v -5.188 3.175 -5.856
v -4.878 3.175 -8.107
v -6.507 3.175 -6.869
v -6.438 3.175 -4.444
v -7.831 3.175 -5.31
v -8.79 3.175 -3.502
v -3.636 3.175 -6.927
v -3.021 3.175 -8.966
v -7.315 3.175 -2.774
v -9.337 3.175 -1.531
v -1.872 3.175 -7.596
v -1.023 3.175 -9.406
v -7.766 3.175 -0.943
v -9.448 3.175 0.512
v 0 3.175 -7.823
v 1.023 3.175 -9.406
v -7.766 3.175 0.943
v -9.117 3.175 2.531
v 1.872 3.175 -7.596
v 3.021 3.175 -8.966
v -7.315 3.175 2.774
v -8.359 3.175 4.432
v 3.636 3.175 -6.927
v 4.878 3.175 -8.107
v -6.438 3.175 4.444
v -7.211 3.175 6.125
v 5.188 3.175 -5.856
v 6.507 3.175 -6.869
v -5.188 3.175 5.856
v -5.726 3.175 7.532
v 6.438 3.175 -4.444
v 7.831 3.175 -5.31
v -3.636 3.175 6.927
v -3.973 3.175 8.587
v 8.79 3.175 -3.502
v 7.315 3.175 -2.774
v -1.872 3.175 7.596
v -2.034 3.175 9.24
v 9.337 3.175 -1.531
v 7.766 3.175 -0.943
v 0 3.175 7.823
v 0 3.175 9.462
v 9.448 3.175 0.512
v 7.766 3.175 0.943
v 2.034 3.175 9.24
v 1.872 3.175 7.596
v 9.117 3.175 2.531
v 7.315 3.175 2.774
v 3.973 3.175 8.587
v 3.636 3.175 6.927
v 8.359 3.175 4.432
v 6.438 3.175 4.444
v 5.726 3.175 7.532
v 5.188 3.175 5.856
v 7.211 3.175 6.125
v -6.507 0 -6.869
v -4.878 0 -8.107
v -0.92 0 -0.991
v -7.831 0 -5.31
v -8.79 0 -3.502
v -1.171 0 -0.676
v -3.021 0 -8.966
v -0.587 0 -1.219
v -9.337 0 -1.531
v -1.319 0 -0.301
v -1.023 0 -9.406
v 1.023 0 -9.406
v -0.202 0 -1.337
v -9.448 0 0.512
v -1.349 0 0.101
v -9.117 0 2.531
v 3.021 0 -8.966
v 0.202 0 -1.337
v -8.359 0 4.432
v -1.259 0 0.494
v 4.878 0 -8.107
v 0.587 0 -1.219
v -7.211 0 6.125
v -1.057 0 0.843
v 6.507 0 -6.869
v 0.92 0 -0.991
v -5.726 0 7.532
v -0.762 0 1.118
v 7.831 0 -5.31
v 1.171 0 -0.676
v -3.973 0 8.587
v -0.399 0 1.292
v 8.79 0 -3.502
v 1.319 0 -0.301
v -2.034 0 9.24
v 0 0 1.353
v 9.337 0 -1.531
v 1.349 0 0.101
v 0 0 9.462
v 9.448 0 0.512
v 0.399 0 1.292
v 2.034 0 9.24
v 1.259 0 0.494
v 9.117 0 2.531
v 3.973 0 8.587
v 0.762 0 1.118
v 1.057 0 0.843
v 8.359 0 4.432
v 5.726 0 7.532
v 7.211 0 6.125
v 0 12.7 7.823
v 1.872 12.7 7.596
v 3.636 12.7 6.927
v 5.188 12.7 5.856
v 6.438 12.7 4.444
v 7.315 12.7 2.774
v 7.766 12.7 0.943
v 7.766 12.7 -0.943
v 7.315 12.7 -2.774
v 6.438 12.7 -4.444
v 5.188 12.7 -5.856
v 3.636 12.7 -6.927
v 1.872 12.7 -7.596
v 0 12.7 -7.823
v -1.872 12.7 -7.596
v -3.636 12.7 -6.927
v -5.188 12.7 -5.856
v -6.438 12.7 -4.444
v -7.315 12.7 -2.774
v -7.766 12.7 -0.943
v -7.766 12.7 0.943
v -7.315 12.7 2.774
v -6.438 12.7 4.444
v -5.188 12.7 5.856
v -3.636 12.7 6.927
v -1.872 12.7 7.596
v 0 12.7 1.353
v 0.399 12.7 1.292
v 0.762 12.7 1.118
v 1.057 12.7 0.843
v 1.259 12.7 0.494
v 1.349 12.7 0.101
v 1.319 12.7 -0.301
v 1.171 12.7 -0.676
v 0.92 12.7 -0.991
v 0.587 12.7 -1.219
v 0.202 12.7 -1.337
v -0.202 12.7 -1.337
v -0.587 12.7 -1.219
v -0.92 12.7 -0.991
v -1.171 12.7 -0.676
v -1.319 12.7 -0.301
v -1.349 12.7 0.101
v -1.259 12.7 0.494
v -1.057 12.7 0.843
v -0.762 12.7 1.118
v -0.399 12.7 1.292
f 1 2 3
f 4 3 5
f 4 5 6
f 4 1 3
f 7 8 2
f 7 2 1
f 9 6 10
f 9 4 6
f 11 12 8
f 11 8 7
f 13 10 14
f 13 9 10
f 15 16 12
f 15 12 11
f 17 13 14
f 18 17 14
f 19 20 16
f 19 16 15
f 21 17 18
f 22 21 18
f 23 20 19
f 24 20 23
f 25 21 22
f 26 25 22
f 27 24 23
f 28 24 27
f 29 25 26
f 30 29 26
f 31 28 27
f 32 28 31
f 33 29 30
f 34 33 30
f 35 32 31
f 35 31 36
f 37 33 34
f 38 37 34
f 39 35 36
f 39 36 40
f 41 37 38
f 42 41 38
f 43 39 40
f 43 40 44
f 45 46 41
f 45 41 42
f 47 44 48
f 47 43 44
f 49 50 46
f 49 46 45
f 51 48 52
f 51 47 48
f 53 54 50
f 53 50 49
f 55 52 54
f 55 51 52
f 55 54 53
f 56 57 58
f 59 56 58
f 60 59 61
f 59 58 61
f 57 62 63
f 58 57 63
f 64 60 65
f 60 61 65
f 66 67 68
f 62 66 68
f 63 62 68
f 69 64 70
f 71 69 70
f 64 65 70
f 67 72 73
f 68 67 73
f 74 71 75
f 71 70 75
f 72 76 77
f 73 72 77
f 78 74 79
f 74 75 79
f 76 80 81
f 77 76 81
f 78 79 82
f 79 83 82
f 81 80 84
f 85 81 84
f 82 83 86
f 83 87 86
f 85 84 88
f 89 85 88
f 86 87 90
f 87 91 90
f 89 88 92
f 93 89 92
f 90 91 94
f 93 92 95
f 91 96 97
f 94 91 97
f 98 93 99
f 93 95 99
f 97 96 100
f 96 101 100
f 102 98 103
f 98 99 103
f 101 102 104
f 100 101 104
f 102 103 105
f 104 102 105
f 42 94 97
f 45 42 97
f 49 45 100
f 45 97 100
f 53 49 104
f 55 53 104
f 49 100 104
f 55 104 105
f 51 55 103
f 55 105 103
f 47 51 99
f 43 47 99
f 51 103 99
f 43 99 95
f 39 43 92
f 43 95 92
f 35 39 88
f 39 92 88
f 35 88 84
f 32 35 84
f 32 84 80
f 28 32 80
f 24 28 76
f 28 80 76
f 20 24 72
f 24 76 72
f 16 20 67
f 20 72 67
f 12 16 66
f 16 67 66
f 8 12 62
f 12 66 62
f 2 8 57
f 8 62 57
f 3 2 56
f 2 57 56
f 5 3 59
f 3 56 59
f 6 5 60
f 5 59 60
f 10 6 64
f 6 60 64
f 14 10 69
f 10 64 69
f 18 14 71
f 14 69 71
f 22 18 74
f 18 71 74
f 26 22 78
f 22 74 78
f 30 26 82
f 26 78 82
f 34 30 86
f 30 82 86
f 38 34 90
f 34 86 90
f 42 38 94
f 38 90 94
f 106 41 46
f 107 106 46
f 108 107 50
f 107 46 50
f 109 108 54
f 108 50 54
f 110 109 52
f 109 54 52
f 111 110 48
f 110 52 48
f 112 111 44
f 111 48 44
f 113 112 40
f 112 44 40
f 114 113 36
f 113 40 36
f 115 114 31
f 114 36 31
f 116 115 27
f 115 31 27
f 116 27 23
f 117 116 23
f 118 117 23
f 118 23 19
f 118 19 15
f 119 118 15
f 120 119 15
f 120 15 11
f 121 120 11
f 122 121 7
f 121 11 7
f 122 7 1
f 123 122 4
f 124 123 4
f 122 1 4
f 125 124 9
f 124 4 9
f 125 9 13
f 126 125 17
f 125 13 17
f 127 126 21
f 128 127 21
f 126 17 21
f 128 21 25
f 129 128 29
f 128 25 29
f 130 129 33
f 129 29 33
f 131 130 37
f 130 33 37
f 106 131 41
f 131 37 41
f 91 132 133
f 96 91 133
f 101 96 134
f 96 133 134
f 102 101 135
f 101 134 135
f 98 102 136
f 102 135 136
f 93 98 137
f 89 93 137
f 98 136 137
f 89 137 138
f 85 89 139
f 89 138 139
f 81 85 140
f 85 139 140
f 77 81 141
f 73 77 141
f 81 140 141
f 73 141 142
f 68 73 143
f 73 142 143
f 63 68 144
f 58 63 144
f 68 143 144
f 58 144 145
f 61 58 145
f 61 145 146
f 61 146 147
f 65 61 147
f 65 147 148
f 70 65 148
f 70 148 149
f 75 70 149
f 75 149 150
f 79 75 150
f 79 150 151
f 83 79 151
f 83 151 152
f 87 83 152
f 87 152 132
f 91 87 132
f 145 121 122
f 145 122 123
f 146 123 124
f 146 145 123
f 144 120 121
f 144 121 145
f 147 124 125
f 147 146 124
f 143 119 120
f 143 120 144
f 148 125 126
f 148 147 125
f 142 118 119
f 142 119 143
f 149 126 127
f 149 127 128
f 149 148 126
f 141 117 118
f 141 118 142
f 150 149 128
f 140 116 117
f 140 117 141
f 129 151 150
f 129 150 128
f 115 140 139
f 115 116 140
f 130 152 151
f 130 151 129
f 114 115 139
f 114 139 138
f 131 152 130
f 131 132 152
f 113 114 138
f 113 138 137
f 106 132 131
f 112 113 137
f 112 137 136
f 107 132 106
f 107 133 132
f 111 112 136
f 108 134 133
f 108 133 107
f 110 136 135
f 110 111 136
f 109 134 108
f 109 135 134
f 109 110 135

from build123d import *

# Parameters (mm, degrees)
SKETCH1_R             = 9.4615
EXTRUDE1_DEPTH        = 3.175
SKETCH2_R             = 7.8232
EXTRUDE2_DEPTH        = 9.525
F_6_32_TAPPED_HOLE2_D = 2.7051


with BuildPart() as part:
    # Sketch1 → Extrude1 (new body)
    with BuildSketch(Plane(origin=(0, 0, 0), x_dir=(1, 0, 0), z_dir=(0, 1, 0))):
        with Locations(Location((0, 0, 0), (0, 0, 270))):  # turned: the seam where the file's is
            Circle(SKETCH1_R)
    extrude(amount=EXTRUDE1_DEPTH)

    # Sketch2 → Extrude2 (add)
    with BuildSketch(Plane(origin=(0, 3.175, 0), x_dir=(1, 0, 0), z_dir=(0, 1, 0))):
        with Locations(Location((0, 0, 0), (0, 0, 270))):  # turned: the seam where the file's is
            Circle(SKETCH2_R)
    extrude(amount=EXTRUDE2_DEPTH)

    # #6-32 Tapped Hole2 (through all)
    with Locations(Plane(origin=(0, 0, 0), x_dir=(0, 0, -1), z_dir=(0, -1, 0))):
        with Locations((0, 0)):
            Hole(F_6_32_TAPPED_HOLE2_D / 2)


solid = part.part
